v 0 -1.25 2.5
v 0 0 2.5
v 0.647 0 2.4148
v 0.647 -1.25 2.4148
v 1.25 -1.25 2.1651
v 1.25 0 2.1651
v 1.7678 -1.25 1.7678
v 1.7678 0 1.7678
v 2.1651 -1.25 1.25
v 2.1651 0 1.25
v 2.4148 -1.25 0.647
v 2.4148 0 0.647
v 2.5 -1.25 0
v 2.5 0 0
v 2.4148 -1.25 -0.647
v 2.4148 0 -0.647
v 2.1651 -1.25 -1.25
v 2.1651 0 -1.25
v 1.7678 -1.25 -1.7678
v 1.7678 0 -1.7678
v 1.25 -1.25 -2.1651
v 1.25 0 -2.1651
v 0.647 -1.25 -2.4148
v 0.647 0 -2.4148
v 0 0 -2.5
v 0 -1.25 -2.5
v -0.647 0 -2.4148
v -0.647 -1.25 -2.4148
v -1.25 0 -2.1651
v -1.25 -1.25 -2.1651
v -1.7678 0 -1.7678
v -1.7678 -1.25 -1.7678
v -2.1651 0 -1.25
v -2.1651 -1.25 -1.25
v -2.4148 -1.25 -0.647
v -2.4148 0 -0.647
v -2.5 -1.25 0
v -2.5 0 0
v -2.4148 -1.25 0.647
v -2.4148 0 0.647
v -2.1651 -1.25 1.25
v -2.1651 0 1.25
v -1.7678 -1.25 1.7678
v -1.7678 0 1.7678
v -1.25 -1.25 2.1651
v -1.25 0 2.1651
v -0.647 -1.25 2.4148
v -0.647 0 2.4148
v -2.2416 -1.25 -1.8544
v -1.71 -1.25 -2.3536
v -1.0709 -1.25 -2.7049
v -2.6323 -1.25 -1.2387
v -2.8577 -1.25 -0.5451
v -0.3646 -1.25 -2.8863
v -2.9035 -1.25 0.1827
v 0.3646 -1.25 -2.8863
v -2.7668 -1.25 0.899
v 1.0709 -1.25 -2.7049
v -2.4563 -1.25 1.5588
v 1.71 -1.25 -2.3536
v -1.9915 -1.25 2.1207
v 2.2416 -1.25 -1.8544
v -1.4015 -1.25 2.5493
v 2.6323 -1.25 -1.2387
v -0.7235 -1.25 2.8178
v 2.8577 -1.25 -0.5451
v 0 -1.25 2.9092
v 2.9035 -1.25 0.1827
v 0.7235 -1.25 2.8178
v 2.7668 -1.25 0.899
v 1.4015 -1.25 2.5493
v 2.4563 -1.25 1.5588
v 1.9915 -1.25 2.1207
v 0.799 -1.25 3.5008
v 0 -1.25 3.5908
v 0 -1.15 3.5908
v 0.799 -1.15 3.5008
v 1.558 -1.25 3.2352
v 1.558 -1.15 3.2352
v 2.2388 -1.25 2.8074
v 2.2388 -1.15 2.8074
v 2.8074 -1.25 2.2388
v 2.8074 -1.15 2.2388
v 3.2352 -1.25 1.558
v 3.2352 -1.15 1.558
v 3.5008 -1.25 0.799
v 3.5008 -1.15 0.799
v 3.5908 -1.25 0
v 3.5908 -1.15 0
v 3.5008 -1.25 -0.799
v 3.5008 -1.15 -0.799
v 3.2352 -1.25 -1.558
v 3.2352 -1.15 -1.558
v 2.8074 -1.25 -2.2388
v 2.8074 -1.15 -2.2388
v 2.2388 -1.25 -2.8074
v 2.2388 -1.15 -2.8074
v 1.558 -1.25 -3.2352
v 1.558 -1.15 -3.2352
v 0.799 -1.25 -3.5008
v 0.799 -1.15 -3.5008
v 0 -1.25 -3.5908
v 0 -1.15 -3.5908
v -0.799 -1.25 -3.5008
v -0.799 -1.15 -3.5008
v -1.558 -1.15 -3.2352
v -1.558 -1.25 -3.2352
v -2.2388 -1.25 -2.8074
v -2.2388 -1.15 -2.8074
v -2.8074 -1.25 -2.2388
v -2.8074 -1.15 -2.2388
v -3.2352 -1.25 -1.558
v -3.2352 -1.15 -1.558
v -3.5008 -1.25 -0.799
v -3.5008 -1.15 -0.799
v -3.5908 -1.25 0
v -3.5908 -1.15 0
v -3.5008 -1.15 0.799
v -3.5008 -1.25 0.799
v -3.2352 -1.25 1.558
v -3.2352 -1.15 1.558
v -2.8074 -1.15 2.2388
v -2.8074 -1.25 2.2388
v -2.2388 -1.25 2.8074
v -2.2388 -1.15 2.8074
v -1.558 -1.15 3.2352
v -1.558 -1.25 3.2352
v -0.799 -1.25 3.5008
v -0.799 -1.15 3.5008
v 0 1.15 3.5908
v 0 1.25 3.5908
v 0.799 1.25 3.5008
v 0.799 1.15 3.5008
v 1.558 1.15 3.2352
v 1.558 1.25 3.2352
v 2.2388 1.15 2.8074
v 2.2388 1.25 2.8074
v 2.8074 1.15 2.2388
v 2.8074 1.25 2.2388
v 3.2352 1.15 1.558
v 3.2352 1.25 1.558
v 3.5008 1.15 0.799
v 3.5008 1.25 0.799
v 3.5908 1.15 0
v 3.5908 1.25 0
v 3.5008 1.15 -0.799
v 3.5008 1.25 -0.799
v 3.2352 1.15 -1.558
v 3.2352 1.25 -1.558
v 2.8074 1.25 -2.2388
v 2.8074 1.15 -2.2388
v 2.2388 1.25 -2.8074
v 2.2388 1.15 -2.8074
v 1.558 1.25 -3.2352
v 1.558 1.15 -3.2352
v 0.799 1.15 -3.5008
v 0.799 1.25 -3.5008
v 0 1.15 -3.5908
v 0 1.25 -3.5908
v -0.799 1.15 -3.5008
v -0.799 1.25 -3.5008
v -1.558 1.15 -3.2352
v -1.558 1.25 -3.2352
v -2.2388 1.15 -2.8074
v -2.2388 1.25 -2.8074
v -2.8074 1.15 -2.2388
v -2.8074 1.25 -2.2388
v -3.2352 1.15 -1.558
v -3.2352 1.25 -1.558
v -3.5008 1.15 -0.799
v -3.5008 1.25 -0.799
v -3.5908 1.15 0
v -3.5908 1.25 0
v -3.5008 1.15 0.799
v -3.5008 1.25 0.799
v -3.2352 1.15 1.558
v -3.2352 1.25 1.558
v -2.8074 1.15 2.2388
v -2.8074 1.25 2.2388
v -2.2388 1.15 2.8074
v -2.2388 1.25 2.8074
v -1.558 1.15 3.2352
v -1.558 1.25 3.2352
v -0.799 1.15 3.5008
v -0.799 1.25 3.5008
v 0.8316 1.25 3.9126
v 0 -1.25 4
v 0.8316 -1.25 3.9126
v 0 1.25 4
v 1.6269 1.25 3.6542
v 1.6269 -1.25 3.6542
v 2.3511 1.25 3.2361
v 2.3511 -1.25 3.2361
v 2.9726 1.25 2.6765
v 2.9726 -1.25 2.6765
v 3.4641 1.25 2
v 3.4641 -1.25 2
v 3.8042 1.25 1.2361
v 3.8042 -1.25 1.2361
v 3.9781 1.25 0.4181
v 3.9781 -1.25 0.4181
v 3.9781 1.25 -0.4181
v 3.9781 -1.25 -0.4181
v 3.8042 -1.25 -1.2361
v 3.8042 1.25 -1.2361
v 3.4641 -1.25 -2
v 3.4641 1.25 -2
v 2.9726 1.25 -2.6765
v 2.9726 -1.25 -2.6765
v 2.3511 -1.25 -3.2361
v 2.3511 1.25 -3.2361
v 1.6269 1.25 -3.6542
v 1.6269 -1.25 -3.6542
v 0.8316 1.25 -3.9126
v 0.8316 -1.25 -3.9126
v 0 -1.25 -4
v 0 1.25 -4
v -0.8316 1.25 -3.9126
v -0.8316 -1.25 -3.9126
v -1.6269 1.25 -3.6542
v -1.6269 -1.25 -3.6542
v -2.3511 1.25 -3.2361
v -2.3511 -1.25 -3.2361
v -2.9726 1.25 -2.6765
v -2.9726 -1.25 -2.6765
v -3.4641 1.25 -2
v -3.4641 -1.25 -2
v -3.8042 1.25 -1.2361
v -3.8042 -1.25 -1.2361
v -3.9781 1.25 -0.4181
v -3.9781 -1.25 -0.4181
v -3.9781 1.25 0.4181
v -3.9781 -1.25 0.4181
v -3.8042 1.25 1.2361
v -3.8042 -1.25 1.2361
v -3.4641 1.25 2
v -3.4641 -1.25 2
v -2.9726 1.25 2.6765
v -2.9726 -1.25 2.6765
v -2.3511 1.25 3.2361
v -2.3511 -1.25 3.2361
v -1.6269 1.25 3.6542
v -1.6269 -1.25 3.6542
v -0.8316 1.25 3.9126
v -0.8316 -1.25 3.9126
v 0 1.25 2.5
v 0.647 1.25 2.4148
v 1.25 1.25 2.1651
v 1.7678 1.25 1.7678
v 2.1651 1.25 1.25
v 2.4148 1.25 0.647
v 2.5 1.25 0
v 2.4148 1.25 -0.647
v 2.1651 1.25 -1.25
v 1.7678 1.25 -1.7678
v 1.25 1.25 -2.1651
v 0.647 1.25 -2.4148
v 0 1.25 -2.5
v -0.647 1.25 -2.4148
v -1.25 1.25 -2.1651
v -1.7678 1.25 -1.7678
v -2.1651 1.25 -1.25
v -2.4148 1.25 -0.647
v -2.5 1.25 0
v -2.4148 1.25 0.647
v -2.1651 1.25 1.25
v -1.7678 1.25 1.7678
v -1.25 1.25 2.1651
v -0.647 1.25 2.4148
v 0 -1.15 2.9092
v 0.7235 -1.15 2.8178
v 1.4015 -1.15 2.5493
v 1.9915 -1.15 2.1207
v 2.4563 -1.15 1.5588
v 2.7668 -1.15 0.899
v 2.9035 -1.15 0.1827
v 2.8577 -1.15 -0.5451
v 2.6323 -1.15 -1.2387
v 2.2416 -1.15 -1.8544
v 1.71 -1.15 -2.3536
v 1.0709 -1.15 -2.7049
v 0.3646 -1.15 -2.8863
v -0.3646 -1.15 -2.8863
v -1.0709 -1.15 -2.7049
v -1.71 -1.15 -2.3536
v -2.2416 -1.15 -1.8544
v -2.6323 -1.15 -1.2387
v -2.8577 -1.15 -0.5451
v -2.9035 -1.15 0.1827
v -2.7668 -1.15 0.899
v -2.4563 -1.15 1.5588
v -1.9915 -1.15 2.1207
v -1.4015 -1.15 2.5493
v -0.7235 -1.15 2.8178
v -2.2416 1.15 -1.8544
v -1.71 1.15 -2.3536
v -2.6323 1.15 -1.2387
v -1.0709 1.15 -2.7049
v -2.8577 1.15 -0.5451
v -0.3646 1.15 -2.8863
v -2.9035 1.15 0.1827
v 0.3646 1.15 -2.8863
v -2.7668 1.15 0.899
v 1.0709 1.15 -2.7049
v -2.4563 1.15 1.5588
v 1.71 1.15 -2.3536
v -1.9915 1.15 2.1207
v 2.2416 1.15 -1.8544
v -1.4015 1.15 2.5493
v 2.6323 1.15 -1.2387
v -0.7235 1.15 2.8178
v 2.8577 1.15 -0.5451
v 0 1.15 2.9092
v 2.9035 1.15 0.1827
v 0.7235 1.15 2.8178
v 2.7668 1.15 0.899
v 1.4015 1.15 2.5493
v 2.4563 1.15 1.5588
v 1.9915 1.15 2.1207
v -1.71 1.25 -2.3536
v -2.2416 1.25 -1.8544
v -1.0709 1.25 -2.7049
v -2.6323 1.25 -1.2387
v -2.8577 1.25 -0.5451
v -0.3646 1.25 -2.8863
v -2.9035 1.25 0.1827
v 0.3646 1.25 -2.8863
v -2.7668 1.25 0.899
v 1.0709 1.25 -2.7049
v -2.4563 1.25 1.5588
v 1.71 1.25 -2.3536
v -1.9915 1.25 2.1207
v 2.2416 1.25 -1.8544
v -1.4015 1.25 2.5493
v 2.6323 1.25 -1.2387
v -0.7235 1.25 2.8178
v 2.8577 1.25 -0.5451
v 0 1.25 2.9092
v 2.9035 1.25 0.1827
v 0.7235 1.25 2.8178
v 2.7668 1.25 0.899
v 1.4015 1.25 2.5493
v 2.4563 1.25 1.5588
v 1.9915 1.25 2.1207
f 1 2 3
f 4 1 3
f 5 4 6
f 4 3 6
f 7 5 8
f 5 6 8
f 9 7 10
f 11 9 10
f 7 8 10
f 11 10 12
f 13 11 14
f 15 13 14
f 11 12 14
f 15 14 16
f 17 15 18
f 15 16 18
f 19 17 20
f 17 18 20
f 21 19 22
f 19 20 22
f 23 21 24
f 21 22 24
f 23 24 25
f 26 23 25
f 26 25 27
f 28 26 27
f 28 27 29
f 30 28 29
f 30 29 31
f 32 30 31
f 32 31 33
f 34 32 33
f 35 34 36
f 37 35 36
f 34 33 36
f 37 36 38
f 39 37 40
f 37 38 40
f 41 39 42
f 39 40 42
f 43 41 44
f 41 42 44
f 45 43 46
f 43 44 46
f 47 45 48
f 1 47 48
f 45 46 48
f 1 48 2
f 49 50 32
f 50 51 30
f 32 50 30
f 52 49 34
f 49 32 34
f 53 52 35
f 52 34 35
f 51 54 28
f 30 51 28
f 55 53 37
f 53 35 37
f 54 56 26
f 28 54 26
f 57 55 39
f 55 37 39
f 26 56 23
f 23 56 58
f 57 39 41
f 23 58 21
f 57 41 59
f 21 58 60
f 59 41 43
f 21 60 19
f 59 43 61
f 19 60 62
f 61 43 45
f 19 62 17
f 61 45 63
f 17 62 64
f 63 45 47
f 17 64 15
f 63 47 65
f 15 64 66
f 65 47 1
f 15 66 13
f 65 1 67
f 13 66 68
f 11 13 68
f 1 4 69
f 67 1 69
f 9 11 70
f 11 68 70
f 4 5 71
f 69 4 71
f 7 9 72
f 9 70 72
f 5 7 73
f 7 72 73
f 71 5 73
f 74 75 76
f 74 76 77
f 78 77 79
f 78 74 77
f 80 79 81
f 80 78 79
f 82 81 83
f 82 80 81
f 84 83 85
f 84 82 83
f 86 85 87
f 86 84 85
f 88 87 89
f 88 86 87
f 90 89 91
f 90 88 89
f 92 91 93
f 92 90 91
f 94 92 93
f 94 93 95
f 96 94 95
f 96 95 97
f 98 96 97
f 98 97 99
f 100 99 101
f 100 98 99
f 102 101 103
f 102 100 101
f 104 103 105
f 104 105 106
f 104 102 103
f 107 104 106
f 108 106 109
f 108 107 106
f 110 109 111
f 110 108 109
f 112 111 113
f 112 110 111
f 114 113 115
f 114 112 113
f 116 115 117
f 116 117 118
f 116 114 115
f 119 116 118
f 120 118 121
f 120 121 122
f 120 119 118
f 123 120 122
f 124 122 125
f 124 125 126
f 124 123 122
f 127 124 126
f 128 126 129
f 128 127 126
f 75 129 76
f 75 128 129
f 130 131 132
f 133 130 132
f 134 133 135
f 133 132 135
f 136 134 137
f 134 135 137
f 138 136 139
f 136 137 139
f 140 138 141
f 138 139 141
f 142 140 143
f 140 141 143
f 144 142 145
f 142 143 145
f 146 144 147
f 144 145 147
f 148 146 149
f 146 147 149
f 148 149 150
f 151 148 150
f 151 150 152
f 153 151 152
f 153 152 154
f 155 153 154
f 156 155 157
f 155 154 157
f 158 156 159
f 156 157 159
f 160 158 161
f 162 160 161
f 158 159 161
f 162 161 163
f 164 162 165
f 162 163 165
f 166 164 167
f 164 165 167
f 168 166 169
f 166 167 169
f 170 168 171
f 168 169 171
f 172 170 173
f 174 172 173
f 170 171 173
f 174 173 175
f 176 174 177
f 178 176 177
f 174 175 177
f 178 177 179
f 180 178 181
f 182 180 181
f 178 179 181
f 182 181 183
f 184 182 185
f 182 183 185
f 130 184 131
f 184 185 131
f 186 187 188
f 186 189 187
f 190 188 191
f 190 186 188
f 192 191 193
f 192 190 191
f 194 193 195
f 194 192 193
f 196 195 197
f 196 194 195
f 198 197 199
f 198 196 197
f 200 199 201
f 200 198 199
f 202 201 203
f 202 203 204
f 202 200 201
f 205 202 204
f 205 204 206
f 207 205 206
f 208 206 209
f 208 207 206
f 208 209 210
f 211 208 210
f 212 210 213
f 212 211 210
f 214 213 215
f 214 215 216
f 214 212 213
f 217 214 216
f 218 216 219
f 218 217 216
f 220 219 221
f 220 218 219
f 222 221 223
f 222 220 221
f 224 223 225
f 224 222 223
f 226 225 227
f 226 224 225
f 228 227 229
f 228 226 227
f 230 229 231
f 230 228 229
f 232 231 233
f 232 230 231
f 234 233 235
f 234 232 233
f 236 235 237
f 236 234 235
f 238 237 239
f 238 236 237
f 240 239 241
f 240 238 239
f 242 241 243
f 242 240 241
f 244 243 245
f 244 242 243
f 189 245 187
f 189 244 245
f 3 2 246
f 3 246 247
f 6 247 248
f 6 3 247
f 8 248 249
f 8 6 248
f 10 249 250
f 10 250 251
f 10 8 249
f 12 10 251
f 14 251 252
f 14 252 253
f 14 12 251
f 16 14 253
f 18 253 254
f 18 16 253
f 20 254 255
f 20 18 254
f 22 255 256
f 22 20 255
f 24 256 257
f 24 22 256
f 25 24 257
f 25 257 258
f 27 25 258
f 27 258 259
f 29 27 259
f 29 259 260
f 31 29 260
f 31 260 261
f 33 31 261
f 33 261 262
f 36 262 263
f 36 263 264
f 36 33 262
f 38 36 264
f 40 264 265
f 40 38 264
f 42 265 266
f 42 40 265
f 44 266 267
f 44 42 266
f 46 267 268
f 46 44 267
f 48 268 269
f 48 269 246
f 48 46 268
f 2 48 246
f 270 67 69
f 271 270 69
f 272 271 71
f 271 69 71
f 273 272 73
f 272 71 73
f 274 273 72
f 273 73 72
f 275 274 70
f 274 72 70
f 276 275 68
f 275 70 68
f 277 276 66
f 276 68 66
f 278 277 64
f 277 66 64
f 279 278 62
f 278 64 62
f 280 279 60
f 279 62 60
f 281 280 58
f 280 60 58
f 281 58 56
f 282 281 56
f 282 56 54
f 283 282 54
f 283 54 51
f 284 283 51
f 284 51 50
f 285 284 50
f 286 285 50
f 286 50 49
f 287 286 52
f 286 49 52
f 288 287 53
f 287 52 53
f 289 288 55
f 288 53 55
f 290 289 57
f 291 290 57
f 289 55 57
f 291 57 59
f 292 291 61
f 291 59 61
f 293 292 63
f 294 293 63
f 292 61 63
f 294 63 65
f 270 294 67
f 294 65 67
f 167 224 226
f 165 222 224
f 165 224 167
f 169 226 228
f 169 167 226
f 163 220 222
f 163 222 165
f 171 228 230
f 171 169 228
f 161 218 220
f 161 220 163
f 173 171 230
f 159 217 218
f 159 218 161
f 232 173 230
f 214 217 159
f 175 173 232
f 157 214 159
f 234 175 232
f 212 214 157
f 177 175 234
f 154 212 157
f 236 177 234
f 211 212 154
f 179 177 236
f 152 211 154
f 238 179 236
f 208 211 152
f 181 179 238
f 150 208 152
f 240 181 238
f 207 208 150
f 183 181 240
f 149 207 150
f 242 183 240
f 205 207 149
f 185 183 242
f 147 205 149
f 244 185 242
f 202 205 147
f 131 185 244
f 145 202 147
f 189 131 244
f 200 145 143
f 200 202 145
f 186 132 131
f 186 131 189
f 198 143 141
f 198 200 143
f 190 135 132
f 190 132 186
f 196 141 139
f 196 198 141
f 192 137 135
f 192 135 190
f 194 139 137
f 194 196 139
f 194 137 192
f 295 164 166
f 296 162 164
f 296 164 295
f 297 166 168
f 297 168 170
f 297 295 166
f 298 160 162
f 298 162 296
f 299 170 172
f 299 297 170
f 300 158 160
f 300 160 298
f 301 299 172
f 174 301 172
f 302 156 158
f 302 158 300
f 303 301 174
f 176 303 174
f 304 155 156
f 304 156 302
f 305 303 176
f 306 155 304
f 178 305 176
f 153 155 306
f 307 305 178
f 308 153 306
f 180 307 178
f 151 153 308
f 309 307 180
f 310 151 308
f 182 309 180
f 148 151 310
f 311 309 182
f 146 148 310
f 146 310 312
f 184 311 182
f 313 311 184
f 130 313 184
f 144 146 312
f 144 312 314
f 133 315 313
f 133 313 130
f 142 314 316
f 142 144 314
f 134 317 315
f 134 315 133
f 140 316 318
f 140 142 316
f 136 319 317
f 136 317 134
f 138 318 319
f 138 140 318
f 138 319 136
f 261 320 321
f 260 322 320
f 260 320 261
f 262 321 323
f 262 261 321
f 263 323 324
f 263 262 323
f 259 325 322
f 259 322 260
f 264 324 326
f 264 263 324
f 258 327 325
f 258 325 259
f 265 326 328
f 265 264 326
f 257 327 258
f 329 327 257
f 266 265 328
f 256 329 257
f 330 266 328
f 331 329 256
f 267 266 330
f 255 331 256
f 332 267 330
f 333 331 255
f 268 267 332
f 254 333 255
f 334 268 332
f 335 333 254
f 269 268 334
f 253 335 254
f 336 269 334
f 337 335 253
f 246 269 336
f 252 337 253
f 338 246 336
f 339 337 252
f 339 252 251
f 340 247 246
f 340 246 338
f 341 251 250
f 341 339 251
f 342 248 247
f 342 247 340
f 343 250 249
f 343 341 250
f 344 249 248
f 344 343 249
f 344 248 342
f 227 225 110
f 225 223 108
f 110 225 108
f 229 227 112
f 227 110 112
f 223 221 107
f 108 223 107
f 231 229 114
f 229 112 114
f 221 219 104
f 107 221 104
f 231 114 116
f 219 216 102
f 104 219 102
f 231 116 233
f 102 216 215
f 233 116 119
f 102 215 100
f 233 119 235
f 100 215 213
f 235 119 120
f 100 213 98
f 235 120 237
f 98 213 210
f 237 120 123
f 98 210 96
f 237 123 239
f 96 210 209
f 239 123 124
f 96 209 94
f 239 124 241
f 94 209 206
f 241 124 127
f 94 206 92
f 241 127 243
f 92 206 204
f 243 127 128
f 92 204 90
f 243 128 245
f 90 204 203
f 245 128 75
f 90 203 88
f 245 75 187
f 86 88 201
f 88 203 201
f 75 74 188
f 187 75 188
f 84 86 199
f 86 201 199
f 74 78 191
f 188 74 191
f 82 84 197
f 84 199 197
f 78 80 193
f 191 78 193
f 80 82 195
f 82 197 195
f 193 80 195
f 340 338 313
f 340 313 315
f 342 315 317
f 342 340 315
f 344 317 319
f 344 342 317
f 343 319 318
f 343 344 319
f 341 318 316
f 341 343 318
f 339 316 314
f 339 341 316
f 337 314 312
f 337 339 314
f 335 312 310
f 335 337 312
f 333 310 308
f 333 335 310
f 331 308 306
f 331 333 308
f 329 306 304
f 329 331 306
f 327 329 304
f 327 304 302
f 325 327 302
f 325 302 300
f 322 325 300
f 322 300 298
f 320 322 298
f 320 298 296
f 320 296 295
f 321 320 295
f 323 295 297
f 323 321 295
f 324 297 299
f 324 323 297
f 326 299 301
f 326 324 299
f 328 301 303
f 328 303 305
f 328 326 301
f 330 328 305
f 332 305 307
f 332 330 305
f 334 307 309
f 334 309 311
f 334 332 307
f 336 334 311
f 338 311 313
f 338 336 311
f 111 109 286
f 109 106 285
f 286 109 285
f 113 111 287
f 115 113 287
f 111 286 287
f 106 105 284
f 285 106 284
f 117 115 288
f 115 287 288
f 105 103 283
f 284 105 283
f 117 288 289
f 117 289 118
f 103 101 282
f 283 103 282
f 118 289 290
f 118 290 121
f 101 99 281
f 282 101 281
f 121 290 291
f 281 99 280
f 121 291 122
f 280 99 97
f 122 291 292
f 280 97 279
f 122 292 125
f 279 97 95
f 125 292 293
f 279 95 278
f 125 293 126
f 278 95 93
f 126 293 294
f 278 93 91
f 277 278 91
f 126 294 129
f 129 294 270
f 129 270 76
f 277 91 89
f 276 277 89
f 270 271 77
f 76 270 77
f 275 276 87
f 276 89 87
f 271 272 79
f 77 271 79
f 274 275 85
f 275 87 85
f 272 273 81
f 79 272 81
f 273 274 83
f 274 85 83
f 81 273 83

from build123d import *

# Parameters (mm, degrees)
SKETCH1_R           = 4
SKETCH1_R_2         = 2.5
BOSS_EXTRUDE1_DEPTH = 1.25
SKETCH2_R           = 3.590807055
SKETCH2_R_2         = 2.909192945
CUT_EXTRUDE1_DEPTH  = 0.1


with BuildPart() as part:
    # Sketch1 → Boss-Extrude1 (new body)
    with BuildSketch(Plane(origin=(0, 0, 0), x_dir=(1, 0, 0), z_dir=(0, 1, 0))):
        with Locations(Location((0, 0, 0), (0, 0, 270))):
            Circle(SKETCH1_R)
        with Locations(Location((0, 0, 0), (0, 0, 270))):
            Circle(SKETCH1_R_2, mode=Mode.SUBTRACT)
    extrude(amount=BOSS_EXTRUDE1_DEPTH)

    # Sketch2 → Cut-Extrude1 (cut)
    with BuildSketch(Plane(origin=(0, 1.25, 0), x_dir=(1, 0, 0), z_dir=(0, 1, 0))):
        with Locations(Location((0, 0, 0), (0, 0, 270))):
            Circle(SKETCH2_R)
        with Locations(Location((0, 0, 0), (0, 0, 270))):
            Circle(SKETCH2_R_2, mode=Mode.SUBTRACT)
    extrude(amount=-CUT_EXTRUDE1_DEPTH, mode=Mode.SUBTRACT)

    # Mirror1: part across plane


with BuildPart() as part_1:
    add(part.part)
    add(part.part.mirror(Plane.ZX))


solid = part_1.part
